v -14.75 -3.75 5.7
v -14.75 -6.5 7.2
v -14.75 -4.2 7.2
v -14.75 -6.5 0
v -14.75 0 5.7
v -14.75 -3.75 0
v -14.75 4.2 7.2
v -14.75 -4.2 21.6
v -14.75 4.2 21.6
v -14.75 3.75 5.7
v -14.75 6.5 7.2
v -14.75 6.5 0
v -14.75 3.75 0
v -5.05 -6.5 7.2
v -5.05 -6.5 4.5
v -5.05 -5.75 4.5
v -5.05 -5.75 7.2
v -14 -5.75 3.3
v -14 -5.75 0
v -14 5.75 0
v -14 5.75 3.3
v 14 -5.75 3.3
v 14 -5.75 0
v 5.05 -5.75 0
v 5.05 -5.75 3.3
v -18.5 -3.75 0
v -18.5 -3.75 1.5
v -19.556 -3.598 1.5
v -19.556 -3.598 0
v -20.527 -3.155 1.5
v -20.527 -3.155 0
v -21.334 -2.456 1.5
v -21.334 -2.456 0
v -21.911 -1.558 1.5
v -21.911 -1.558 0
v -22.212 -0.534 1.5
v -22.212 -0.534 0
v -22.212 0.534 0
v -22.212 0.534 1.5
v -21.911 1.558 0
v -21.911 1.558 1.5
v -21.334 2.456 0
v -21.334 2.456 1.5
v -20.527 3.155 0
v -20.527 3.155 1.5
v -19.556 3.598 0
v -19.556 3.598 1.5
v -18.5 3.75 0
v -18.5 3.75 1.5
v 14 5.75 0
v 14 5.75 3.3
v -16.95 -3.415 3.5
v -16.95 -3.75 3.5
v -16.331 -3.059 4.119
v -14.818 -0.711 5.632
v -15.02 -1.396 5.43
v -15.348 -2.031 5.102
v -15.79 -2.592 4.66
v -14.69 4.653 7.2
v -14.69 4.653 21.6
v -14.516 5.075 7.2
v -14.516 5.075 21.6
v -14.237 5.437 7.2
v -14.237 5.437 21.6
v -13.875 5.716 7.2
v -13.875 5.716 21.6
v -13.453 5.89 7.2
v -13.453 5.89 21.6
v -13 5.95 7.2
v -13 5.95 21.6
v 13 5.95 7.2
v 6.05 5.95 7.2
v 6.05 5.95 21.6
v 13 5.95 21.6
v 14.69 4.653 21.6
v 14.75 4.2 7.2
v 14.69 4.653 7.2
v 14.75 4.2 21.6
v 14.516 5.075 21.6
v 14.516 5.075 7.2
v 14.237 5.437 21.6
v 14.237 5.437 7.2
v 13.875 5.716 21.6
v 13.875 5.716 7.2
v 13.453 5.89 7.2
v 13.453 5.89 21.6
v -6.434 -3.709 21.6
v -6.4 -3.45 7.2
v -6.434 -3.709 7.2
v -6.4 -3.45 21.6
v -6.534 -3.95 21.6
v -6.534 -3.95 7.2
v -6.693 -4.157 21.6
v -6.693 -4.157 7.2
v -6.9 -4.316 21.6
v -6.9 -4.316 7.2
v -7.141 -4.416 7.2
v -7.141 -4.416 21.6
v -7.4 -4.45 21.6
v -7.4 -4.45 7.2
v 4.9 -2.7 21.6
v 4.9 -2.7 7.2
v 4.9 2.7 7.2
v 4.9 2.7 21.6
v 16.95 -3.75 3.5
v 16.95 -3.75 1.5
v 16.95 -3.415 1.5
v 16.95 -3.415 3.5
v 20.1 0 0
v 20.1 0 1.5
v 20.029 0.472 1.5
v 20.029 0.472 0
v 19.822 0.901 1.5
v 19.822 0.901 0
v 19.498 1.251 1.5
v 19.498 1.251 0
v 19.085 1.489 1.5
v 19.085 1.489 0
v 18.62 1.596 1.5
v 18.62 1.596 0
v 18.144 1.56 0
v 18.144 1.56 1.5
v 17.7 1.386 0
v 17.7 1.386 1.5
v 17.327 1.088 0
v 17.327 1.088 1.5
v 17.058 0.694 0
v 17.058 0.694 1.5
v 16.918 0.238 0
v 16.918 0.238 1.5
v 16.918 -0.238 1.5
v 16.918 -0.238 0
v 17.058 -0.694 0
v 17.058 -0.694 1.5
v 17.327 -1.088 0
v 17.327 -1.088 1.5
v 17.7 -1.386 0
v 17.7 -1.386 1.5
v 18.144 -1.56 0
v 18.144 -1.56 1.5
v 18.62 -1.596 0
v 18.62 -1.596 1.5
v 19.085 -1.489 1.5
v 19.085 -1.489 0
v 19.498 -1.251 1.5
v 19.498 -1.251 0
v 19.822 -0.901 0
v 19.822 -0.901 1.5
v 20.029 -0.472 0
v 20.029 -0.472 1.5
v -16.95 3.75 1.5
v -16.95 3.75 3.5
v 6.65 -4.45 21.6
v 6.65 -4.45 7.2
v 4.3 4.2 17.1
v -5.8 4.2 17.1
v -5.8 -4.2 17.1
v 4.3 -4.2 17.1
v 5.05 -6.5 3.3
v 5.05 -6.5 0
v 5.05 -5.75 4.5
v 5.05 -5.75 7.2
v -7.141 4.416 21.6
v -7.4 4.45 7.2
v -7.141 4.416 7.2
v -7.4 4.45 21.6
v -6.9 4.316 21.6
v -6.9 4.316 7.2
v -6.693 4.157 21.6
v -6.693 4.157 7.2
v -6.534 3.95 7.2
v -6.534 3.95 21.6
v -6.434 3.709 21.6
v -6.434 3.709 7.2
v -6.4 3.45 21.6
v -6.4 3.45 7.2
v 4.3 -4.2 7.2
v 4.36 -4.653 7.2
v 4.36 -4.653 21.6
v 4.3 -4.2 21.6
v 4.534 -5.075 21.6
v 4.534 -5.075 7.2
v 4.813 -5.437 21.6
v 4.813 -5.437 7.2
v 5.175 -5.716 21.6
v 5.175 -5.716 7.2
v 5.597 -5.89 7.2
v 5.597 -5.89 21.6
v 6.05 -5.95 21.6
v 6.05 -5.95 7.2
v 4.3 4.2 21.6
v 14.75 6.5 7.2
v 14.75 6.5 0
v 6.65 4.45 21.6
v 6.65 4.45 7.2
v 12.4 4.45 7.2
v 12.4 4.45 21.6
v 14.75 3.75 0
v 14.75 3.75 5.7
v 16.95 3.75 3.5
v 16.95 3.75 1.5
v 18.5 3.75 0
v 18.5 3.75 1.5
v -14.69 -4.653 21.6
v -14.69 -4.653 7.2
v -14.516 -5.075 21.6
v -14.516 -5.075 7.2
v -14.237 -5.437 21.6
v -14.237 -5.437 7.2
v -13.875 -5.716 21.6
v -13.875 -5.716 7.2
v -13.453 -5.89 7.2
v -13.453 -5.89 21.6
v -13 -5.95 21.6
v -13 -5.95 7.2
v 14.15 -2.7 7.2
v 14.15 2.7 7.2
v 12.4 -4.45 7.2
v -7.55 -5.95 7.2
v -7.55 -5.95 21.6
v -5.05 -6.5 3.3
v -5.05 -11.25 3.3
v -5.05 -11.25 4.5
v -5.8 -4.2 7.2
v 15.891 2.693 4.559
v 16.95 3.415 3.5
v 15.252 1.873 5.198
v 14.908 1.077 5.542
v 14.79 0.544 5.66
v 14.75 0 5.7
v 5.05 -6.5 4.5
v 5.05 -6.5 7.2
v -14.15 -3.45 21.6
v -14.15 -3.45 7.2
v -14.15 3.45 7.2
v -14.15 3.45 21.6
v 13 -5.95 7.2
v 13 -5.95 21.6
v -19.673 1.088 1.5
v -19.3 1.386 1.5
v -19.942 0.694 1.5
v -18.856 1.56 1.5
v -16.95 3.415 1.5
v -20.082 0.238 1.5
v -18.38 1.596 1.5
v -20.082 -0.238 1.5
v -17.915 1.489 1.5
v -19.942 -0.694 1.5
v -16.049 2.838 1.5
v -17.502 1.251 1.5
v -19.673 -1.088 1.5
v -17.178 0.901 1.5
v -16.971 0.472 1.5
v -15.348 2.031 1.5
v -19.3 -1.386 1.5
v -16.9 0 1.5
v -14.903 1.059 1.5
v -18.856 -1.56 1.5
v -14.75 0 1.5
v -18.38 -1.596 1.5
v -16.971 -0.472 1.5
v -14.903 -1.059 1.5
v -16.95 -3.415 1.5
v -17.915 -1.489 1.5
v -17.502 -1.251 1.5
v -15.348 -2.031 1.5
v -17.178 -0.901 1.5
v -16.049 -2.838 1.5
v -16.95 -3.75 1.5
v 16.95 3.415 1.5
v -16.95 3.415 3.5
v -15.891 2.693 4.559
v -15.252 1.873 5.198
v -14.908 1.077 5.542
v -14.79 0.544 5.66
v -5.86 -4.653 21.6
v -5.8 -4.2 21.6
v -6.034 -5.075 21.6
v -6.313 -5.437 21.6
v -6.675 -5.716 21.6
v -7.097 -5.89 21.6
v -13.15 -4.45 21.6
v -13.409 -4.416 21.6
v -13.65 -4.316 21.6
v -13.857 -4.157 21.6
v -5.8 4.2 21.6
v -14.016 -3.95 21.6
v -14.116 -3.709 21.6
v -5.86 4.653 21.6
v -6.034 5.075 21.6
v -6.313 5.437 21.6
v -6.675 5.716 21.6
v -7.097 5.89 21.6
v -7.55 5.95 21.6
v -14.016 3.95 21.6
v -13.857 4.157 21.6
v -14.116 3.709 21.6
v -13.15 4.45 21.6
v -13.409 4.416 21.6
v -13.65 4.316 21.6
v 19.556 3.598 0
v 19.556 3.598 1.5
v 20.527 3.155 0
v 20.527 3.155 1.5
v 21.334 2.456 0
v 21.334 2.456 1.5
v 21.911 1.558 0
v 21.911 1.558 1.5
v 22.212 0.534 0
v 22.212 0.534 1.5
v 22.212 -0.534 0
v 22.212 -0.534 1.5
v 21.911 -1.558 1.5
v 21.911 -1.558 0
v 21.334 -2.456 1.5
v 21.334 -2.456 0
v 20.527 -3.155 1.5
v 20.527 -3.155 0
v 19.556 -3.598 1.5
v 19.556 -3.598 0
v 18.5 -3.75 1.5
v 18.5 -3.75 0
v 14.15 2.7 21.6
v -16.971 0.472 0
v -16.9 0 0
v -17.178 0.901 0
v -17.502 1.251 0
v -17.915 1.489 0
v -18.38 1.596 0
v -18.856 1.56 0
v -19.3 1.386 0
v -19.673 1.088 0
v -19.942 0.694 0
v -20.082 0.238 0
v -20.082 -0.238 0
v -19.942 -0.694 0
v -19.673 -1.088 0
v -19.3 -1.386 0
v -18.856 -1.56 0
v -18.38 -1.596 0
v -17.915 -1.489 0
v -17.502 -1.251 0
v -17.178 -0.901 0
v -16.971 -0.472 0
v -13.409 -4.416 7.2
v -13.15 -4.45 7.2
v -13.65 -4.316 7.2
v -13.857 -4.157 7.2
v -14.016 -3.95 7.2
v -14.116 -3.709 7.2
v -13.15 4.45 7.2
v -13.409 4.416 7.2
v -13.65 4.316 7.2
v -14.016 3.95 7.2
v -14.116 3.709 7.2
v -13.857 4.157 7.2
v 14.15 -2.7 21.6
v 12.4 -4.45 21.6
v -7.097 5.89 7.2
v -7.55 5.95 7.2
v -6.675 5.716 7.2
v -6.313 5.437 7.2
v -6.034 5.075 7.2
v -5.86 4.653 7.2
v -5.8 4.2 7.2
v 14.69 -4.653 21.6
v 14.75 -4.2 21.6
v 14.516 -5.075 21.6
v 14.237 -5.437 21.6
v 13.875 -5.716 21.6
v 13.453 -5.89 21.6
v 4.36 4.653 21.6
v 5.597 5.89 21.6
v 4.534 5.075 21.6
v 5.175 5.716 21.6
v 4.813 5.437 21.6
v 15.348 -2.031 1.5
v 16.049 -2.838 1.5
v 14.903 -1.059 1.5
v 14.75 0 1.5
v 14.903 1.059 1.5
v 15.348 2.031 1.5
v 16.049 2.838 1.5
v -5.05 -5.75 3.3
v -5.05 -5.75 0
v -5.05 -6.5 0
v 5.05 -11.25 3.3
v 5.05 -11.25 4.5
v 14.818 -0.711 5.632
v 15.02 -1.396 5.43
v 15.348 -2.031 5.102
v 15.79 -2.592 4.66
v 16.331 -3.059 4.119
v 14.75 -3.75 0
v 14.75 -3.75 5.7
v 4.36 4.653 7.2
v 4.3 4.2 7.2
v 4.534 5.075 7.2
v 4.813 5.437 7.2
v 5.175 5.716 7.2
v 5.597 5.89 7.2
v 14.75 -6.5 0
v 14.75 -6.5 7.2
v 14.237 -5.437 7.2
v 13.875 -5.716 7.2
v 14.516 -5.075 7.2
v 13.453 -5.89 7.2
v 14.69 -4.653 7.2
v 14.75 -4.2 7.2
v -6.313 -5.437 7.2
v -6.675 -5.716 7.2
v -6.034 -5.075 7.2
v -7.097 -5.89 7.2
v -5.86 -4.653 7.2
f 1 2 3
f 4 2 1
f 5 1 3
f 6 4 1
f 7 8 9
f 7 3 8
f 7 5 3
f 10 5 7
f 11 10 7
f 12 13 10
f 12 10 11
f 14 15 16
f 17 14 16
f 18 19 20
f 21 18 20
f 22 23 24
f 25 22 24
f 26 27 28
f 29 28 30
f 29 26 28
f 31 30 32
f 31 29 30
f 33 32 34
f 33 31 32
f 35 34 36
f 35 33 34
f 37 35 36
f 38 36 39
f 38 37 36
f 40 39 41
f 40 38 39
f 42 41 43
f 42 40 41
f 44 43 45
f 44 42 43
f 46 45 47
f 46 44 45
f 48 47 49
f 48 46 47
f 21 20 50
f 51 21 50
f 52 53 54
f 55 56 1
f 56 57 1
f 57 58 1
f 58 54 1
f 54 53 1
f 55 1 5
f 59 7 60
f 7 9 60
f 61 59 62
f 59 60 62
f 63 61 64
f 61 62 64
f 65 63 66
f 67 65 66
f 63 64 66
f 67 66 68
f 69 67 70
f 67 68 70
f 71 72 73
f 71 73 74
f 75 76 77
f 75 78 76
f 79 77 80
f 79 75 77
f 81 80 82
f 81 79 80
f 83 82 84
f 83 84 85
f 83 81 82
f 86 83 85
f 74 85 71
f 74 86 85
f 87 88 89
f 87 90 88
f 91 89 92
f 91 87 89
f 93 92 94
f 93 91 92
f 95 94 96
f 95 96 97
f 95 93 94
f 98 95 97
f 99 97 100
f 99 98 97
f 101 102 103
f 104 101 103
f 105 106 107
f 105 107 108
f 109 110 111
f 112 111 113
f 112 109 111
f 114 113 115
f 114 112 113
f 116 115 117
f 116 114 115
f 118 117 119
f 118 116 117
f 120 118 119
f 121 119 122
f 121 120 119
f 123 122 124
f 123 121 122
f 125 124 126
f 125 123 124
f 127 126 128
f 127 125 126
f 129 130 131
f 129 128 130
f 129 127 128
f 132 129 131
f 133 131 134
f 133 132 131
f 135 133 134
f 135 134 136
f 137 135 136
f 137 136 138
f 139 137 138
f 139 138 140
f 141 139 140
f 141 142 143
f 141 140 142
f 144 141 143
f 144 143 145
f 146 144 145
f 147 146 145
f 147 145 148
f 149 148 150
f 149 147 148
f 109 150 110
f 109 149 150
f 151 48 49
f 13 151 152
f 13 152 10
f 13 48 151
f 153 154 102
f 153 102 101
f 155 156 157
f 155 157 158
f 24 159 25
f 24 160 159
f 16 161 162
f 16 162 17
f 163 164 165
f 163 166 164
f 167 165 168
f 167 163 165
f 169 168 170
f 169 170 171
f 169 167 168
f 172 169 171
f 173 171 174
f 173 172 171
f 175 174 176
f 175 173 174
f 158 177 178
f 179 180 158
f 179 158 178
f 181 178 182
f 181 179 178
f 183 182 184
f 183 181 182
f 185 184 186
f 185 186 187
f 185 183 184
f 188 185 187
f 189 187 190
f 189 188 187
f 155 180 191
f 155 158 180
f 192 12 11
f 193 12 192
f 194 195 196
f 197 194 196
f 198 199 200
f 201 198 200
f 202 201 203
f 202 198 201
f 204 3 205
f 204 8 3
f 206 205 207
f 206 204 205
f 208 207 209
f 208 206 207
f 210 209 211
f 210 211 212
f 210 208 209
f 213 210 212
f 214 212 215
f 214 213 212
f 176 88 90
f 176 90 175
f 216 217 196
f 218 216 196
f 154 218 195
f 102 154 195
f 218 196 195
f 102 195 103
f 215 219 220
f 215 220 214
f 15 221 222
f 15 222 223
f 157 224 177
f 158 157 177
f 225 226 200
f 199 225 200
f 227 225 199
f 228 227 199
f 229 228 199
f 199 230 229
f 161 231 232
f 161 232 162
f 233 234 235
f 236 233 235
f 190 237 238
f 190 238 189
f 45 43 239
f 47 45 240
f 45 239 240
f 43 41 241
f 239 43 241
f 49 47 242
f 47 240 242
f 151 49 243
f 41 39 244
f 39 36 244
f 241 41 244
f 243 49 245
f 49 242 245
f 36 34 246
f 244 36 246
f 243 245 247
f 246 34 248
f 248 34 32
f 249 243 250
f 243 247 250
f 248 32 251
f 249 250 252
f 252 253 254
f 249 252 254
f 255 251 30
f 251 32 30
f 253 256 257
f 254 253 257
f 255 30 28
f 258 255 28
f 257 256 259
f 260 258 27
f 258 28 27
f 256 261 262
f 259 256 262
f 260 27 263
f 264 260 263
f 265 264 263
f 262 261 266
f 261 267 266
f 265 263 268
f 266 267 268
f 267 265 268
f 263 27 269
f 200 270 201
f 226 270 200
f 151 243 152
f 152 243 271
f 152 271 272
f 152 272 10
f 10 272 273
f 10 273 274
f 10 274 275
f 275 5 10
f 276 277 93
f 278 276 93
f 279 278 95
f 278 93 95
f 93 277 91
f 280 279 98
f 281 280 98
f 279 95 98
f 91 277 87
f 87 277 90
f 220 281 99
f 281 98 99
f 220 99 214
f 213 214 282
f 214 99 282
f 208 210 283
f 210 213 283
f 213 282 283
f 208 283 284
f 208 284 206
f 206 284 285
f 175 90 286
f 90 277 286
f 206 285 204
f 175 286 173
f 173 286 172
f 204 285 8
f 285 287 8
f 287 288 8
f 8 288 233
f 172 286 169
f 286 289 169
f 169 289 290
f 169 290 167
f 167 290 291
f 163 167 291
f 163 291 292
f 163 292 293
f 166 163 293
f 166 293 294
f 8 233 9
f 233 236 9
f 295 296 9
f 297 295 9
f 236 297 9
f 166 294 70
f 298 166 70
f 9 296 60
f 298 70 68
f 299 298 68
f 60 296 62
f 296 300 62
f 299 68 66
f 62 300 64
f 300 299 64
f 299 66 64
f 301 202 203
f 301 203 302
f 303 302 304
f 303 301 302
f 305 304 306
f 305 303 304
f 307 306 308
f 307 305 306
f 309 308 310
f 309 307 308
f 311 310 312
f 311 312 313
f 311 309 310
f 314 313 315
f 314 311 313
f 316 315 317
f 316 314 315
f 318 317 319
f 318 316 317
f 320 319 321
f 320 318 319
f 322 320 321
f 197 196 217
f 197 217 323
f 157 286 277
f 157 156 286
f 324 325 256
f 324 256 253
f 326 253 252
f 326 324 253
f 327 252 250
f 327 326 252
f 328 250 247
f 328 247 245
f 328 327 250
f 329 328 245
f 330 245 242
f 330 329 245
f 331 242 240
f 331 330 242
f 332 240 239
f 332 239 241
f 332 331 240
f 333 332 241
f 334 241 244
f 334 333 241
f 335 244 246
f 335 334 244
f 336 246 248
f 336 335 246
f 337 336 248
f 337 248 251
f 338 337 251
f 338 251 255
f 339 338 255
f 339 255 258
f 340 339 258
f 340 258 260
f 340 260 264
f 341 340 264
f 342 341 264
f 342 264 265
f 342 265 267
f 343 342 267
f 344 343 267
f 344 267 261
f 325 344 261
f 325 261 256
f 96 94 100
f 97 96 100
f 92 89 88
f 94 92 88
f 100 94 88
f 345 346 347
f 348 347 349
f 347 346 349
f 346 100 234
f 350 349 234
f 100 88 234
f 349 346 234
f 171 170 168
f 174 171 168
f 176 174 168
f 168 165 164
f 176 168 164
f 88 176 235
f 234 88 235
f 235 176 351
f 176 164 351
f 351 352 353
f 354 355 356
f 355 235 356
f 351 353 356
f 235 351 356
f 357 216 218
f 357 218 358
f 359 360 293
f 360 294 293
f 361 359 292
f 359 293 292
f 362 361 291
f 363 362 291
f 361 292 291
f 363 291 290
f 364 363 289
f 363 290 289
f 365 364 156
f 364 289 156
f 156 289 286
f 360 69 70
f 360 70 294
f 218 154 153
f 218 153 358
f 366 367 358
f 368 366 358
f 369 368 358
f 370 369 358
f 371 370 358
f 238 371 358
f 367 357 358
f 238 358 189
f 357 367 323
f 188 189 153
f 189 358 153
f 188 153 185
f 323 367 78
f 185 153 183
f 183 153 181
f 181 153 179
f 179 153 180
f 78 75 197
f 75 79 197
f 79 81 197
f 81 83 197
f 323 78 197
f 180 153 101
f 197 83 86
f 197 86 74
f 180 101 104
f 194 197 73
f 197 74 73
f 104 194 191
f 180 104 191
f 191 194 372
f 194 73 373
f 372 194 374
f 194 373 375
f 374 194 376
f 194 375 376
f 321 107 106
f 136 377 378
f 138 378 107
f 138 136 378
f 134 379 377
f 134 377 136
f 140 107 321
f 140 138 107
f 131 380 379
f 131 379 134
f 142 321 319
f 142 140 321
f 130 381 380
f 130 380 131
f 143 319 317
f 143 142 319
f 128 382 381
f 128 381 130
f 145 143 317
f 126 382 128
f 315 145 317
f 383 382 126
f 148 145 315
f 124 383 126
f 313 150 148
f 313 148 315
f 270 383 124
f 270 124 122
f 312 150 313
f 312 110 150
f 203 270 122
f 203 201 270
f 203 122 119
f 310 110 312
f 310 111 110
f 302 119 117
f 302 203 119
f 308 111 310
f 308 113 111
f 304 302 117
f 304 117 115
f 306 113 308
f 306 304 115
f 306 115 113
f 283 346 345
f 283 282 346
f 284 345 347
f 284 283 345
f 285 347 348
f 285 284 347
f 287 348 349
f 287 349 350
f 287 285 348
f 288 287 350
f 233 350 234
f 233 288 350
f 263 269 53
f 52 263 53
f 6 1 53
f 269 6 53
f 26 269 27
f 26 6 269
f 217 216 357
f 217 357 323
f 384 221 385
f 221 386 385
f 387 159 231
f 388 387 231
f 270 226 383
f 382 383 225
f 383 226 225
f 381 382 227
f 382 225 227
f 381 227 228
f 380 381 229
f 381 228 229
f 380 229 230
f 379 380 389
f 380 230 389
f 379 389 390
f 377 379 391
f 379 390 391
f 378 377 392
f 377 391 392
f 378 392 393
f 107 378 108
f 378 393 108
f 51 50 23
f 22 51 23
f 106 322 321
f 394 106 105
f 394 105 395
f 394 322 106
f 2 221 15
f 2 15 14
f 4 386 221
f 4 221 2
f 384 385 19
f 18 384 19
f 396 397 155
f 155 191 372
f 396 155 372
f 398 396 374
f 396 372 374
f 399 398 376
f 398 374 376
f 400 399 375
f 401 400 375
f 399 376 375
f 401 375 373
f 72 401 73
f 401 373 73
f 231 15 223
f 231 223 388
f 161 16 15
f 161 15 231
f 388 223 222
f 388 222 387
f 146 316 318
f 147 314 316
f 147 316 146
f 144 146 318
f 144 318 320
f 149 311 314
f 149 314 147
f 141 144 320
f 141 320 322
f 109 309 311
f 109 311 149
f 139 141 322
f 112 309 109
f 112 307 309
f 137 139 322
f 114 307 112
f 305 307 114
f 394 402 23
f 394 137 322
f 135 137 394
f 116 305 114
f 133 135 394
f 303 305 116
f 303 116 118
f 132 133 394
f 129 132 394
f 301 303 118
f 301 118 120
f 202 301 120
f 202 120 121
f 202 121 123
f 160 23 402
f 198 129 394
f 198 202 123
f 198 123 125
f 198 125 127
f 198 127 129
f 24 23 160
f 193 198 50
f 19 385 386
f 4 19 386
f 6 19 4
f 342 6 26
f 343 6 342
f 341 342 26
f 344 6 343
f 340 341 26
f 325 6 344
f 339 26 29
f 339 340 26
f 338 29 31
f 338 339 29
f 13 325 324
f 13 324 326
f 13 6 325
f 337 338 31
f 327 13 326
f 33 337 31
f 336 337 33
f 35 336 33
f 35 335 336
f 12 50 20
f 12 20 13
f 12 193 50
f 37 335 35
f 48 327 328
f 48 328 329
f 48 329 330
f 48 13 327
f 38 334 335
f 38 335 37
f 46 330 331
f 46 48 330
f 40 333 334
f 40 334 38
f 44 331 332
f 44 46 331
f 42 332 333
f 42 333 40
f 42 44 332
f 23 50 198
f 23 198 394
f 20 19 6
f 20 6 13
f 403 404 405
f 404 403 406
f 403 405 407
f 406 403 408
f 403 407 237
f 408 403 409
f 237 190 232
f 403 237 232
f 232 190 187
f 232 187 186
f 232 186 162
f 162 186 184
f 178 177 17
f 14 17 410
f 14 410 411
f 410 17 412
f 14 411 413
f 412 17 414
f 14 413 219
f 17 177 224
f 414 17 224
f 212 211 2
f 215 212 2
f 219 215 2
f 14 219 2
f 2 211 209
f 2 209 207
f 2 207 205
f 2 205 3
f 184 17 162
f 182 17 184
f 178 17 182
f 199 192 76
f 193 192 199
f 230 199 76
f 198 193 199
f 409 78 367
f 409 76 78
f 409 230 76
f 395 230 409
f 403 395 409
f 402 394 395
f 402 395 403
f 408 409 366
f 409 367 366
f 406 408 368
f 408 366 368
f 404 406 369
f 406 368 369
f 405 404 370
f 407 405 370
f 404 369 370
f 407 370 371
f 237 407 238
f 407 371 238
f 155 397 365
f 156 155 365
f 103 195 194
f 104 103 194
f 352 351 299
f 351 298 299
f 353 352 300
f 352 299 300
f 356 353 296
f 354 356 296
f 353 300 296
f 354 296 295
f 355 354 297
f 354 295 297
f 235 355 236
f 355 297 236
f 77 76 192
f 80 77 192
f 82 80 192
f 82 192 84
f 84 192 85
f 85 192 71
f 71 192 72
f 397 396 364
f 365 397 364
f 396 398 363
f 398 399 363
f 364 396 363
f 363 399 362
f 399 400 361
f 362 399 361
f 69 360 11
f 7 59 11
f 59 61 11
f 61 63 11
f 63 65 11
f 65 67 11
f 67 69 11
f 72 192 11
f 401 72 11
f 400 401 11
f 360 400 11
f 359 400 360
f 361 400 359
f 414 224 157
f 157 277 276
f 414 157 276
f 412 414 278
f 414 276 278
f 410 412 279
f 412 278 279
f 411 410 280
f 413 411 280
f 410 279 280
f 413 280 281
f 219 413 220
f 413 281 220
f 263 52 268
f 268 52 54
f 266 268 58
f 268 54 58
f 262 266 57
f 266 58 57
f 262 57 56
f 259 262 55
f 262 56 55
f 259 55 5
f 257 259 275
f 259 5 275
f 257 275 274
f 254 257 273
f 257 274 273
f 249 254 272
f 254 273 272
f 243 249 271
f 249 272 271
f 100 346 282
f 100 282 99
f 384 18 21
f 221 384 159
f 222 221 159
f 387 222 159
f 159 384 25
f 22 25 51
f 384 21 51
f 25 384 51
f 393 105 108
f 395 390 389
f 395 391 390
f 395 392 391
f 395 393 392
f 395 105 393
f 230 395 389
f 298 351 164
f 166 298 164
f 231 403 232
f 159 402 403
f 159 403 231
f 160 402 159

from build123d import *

# Parameters (mm, degrees)
SKETCH1_R           = 1.6
BOSS_EXTRUDE1_DEPTH = 7.2
SKETCH2_R           = 3.75
CUT_EXTRUDE1_DEPTH  = 5.7
CUT_EXTRUDE2_DEPTH  = 7.5
SKETCH5_W           = 7.75
SKETCH5_H           = 8.9
SKETCH5_W_2         = 9.25
BOSS_EXTRUDE2_DEPTH = 14.4
SKETCH6_W           = 10.1
SKETCH6_H           = 8.4
CUT_EXTRUDE3_DEPTH  = 4.5
FILLET1_R           = 1.75
FILLET2_R           = 1
CHAMFER1_SIZE       = 1.75
CUT_EXTRUDE4_DEPTH  = 3.3
CUT_EXTRUDE5_REACH  = 20.3
SKETCH8_W           = 10.1
SKETCH8_H           = 0.75
SKETCH9_W           = 10.1
SKETCH9_H           = 1.2
BOSS_EXTRUDE3_DEPTH = 5.5


with BuildPart() as part:
    # Sketch1 → Boss-Extrude1 (new body)
    with BuildSketch(Plane.XY):
        with BuildLine():
            ThreePointArc((18.5, 3.75), (22.25, 0), (18.5, -3.75))
            Line((18.5, -3.75), (14.75, -3.75))
            Line((14.75, -3.75), (14.75, -6.5))
            Line((14.75, -6.5), (-14.75, -6.5))
            Line((-14.75, -6.5), (-14.75, -3.75))
            Line((-14.75, -3.75), (-18.5, -3.75))
            ThreePointArc((-18.5, -3.75), (-22.25, 0), (-18.5, 3.75))
            Line((-18.5, 3.75), (-14.75, 3.75))
            Line((-14.75, 3.75), (-14.75, 6.5))
            Line((-14.75, 6.5), (14.75, 6.5))
            Line((14.75, 6.5), (14.75, 3.75))
            Line((14.75, 3.75), (18.5, 3.75))
        make_face()
        with Locations((-18.5, 0)):
            Circle(SKETCH1_R, mode=Mode.SUBTRACT)
        with Locations((18.5, 0)):
            Circle(SKETCH1_R, mode=Mode.SUBTRACT)
    extrude(amount=BOSS_EXTRUDE1_DEPTH)

    # Sketch2 → Cut-Extrude1 (cut)
    with BuildSketch(Plane.XY.offset(7.2)):
        with Locations((-18.5, 0)):
            Circle(SKETCH2_R)
        with Locations((18.5, 0)):
            Circle(SKETCH2_R)
    extrude(amount=-CUT_EXTRUDE1_DEPTH, mode=Mode.SUBTRACT)

    # Sketch4 → Cut-Extrude2 (cut)
    with BuildSketch(Plane.XZ.offset(3.75)):
        Polygon((-18.5, 1.5), (-16.95, 1.5), (-16.95, 3.5), (-14.75, 5.7), (-14.75, 7.2), (-18.5, 7.2), align=None)
        Polygon((18.5, 1.5), (16.95, 1.5), (16.95, 3.5), (14.75, 5.7), (14.75, 7.2), (18.5, 7.2), align=None)
    extrude(amount=-CUT_EXTRUDE2_DEPTH, mode=Mode.SUBTRACT)

    # Sketch5 → Boss-Extrude2 (add)
    with BuildSketch(Plane.XY.offset(7.2)):
        Polygon((-5.8, -5.95), (-14.75, -5.95), (-14.75, 5.95), (-5.8, 5.95), (-5.8, 4.2), (0, 4.2), (4.3, 4.2), (4.3, 5.95), (14.75, 5.95), (14.75, -5.95), (4.3, -5.95), (4.3, -4.2), (0, -4.2), (-5.8, -4.2), align=None)
        with Locations((-10.275, 0)):
            Rectangle(SKETCH5_W, SKETCH5_H, mode=Mode.SUBTRACT)
        with Locations((9.525, 0)):
            Rectangle(SKETCH5_W_2, SKETCH5_H, mode=Mode.SUBTRACT)
    extrude(amount=BOSS_EXTRUDE2_DEPTH)

    # Sketch6 → Cut-Extrude3 (cut)
    with BuildSketch(Plane.XY.offset(21.6)):
        with Locations((-0.75, 0)):
            Rectangle(SKETCH6_W, SKETCH6_H)
    extrude(amount=-CUT_EXTRUDE3_DEPTH, mode=Mode.SUBTRACT)

    # Fillet1
    fillet1_edges = [part.edges().sort_by_distance(p)[0] for p in [
        (4.3, 5.95, 14.4),
        (14.75, 5.95, 14.4),
        (14.75, -5.95, 14.4),
        (4.3, -5.95, 14.4),
        (-5.8, 5.95, 14.4),
        (-14.75, 5.95, 14.4),
        (-14.75, -5.95, 14.4),
        (-5.8, -5.95, 14.4),
    ]]
    fillet(fillet1_edges, radius=FILLET1_R)

    # Fillet2
    fillet2_edges = [part.edges().sort_by_distance(p)[0] for p in [
        (-6.4, 4.45, 14.4),
        (-14.15, 4.45, 14.4),
        (-14.15, -4.45, 14.4),
        (-6.4, -4.45, 14.4),
    ]]
    fillet(fillet2_edges, radius=FILLET2_R)

    # Chamfer1
    chamfer1_edges = [part.edges().sort_by_distance(p)[0] for p in [
        (14.15, 4.45, 14.4),
        (4.9, 4.45, 14.4),
        (4.9, -4.45, 14.4),
        (14.15, -4.45, 14.4),
    ]]
    chamfer(chamfer1_edges, length=CHAMFER1_SIZE)

    # Sketch7 → Cut-Extrude4 (cut)
    with BuildSketch(Plane(origin=(0, 0, 0), x_dir=(-1, 0, 0), z_dir=(0, 0, -1))):
        Polygon((14, -5.75), (14, 5.75), (-14, 5.75), (-14, -5.75), (-5.05, -5.75), (-5.05, -6.5), (5.05, -6.5), (5.05, -5.75), align=None)
    extrude(amount=-CUT_EXTRUDE4_DEPTH, mode=Mode.SUBTRACT)

    # Sketch8 → Cut-Extrude5 (cut, up to next)
    with BuildSketch(Plane(origin=(0, 0, 3.3), x_dir=(-1, 0, 0), z_dir=(0, 0, -1)), mode=Mode.PRIVATE) as cut_extrude5_sk1:
        with Locations((0, -6.125)):
            Rectangle(SKETCH8_W, SKETCH8_H)
    cut_extrude5_tool1 = extrude(cut_extrude5_sk1.sketch, amount=-CUT_EXTRUDE5_REACH, mode=Mode.PRIVATE) & part.part
    add(cut_extrude5_tool1.solids().sort_by_distance((0, -6.125, 3.3))[0], mode=Mode.SUBTRACT)

    # Sketch9 → Boss-Extrude3 (add)
    with BuildSketch(Plane.XZ.offset(5.75)):
        with Locations((0, 3.9)):
            Rectangle(SKETCH9_W, SKETCH9_H)
    extrude(amount=BOSS_EXTRUDE3_DEPTH)


solid = part.part
